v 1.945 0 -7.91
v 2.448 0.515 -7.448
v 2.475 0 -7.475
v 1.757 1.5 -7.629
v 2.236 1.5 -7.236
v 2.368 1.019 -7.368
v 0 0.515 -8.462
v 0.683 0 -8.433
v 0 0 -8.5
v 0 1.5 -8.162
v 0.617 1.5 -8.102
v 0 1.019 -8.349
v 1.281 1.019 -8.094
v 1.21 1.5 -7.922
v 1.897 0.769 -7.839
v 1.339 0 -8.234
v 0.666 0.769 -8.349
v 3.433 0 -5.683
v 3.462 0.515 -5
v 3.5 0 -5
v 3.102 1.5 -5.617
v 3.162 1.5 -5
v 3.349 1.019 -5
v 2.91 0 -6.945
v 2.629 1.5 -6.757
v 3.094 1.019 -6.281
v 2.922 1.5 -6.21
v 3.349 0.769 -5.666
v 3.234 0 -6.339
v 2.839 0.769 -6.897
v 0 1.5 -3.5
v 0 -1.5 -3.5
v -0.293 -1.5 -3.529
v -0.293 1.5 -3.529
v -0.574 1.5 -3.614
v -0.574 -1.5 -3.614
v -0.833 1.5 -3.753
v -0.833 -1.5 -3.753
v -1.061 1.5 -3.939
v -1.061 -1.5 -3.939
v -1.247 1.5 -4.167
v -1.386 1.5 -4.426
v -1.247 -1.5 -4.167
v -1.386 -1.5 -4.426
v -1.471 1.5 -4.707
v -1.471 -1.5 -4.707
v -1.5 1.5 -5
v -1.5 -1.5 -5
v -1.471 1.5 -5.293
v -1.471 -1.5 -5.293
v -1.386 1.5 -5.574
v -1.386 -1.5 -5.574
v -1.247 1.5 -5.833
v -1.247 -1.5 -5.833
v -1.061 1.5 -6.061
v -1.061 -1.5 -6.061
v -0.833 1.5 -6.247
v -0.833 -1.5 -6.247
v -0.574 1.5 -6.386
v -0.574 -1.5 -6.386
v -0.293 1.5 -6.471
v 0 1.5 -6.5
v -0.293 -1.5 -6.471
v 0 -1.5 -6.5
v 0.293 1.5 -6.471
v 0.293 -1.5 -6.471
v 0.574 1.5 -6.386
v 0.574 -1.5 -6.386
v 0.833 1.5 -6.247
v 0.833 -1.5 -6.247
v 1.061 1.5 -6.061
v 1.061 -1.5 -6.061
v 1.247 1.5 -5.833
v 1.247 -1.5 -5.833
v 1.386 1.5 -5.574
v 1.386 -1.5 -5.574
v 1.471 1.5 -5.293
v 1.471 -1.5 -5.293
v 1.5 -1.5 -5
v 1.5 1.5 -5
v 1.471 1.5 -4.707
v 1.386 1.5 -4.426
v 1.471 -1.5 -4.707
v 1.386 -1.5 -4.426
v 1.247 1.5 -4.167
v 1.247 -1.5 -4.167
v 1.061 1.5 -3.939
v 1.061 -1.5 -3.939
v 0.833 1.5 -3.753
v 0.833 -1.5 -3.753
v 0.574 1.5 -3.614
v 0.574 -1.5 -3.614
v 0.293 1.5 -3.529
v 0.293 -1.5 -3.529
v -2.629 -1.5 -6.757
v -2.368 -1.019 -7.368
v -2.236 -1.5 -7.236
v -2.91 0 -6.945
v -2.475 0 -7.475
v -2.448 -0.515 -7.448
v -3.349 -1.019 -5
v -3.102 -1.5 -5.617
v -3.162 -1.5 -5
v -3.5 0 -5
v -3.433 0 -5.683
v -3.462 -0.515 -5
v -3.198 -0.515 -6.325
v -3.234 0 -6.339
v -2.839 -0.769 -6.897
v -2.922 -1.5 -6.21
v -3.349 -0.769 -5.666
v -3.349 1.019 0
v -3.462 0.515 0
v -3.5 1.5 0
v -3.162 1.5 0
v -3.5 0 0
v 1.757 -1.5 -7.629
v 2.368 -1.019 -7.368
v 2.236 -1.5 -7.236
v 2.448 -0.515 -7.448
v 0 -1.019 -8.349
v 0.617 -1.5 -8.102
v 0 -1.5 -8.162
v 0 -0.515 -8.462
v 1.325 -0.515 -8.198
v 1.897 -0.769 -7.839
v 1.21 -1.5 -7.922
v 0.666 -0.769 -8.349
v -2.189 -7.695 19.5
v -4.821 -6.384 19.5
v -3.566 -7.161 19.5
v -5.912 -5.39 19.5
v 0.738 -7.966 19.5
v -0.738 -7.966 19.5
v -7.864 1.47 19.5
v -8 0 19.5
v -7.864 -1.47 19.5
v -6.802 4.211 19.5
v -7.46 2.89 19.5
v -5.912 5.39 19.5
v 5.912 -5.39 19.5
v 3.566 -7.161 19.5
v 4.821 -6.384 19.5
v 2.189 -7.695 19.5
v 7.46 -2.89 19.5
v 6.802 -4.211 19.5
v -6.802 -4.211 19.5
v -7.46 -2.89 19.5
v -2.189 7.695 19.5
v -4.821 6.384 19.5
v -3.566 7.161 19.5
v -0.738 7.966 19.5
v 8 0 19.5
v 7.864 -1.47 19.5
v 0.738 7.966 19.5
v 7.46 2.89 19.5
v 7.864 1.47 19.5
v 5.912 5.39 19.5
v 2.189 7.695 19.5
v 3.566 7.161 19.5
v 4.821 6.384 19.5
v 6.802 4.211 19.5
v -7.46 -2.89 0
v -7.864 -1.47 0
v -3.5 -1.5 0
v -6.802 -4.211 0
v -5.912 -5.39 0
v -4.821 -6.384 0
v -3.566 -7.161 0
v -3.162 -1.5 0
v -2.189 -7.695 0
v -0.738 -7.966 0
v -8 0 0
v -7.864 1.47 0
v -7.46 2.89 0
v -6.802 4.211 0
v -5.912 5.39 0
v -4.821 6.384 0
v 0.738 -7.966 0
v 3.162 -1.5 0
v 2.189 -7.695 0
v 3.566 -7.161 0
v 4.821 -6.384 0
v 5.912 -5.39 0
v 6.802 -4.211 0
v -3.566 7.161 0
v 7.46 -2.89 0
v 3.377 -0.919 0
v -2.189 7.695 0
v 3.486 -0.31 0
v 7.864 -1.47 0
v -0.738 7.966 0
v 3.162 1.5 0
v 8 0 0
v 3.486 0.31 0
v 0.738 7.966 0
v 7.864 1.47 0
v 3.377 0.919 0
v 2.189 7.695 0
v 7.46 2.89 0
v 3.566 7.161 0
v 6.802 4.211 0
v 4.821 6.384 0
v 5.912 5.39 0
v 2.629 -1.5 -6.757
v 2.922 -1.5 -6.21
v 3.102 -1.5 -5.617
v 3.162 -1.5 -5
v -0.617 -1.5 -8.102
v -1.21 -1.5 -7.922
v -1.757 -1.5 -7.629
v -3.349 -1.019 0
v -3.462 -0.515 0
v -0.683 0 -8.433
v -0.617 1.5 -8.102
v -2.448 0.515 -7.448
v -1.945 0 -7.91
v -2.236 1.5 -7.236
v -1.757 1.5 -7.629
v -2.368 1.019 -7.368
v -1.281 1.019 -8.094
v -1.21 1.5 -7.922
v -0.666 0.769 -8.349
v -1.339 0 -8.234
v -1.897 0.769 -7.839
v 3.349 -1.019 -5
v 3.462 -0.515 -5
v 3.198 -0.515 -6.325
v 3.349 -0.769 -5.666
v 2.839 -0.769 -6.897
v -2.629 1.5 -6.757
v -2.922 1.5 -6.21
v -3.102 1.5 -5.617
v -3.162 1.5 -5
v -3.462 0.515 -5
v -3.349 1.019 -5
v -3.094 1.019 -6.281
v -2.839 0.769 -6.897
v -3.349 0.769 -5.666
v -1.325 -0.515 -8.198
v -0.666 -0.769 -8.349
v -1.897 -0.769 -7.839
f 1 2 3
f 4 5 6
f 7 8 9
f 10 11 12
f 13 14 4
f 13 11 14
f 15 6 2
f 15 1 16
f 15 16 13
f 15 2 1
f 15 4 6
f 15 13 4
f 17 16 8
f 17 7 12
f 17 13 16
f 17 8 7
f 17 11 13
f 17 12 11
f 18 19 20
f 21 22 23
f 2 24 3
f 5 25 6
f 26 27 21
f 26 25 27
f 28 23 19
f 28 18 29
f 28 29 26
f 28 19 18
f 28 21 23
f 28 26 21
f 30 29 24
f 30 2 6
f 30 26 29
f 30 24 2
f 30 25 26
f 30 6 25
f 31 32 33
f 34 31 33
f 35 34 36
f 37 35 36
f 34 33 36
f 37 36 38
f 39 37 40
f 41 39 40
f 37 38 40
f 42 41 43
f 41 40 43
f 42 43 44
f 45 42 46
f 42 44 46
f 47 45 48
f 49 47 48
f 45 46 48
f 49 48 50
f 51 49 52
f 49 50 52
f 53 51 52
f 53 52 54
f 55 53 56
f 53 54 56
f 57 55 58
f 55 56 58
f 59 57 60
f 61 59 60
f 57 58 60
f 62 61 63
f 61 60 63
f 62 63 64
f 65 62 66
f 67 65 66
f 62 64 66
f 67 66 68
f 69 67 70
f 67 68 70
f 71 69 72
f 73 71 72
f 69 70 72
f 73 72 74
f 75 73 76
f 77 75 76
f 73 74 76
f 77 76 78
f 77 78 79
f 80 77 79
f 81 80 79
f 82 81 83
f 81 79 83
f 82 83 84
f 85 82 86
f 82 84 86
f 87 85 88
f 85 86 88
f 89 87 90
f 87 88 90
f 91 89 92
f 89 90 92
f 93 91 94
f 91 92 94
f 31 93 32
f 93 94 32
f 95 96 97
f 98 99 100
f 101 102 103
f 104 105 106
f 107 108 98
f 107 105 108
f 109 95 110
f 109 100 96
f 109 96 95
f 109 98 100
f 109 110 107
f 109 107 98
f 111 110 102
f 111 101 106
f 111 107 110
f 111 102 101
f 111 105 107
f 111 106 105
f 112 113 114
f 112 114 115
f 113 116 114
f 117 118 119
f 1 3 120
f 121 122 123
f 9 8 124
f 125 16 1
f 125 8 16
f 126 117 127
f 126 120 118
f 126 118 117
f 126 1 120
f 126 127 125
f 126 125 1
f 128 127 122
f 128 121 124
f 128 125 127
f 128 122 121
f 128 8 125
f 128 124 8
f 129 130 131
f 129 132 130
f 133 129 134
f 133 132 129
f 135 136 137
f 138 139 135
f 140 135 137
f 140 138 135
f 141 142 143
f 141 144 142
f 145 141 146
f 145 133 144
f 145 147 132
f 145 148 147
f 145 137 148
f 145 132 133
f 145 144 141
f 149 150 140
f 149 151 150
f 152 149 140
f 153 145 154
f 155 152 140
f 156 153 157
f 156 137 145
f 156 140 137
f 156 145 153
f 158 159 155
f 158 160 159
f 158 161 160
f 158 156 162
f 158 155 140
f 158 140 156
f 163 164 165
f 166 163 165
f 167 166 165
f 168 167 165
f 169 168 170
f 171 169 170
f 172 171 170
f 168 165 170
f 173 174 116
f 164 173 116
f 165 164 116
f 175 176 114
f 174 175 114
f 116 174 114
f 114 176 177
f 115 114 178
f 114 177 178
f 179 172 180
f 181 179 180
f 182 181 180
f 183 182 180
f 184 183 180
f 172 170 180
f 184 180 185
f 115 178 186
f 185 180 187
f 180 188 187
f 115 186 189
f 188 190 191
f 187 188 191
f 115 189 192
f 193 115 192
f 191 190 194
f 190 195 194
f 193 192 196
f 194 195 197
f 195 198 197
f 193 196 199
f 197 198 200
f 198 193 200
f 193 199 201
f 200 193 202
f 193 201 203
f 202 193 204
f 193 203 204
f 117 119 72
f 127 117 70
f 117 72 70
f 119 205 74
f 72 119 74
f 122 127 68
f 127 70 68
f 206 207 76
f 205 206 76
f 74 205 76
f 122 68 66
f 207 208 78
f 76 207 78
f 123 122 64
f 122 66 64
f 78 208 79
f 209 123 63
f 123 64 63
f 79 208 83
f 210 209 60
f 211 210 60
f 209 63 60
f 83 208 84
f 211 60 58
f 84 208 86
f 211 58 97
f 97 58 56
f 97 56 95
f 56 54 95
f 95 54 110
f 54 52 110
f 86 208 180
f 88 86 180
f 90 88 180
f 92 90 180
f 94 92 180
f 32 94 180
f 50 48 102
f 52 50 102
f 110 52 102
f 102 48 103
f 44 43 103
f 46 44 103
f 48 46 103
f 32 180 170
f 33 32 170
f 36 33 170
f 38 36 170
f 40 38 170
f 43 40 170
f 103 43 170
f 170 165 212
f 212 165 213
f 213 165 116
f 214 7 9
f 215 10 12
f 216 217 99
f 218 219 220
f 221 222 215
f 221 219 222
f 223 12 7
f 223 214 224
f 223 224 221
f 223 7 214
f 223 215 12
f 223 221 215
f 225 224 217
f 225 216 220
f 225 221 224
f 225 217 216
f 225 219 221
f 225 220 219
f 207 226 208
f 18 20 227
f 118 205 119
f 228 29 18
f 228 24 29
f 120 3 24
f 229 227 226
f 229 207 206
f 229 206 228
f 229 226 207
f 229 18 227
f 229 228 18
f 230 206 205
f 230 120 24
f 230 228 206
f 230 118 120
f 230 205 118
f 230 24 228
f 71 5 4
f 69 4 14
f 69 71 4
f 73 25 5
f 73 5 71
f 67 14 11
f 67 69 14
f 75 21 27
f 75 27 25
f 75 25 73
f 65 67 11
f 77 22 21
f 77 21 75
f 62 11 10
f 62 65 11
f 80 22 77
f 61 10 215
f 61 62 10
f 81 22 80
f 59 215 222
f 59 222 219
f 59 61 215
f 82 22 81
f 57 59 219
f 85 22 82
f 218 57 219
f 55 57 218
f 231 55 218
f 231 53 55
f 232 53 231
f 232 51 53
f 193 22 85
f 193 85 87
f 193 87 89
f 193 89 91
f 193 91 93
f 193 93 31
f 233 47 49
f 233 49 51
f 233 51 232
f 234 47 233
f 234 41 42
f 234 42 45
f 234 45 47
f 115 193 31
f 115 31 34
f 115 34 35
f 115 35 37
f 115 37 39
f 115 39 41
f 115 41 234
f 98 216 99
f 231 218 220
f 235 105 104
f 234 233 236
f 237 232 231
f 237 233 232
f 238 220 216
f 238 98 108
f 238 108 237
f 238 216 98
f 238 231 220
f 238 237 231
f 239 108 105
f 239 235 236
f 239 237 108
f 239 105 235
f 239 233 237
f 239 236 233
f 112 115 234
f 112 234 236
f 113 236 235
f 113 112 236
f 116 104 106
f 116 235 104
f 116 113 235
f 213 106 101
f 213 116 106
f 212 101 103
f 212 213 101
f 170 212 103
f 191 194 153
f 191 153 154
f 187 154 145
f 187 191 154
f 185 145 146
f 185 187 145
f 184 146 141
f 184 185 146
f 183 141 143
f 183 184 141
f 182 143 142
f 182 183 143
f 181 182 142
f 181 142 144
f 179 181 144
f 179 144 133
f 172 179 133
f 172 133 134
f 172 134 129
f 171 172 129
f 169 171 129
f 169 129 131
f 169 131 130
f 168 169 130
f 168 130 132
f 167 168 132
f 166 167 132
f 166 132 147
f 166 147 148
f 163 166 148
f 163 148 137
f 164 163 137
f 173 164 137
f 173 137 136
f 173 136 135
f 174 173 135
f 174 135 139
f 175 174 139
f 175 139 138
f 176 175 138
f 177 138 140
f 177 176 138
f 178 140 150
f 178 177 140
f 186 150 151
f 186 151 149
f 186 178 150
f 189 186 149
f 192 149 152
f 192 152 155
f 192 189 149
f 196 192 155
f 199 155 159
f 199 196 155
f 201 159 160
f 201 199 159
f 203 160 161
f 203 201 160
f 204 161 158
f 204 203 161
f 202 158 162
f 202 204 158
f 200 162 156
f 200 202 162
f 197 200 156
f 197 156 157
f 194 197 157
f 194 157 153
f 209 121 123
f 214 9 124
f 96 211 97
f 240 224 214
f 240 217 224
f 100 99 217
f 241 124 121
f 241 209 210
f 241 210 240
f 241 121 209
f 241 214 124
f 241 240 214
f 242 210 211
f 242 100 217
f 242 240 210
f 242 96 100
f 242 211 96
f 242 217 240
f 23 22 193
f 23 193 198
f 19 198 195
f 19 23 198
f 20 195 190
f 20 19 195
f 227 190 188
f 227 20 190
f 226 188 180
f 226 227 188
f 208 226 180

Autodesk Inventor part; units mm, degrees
ref_plane "YZ Plane" through (0, 0, 0) normal (1, 0, 0) x (0, 1, 0)
ref_plane "XZ Plane" through (0, 0, 0) normal (0, 1, 0) x (-1, 0, 0)
ref_plane "XY Plane" through (0, 0, 0) normal (0, 0, 1) x (1, 0, 0)
sketch "Skizze1" plane through (0, 0, 0) normal (0, 0, 1) x (1, 0, 0)
  line L0 (-11.2, 0) -> (11.2, 0) projected
  line L1 (0, -11.2) -> (0, 11.2) projected
  circle A0 centre (0, 0) radius 8
  dimension "d0" = 16
extrude "Extrusion1" add sketch "Skizze1" along normal blind 19.5
sketch "Skizze2" plane through (0, 0, 0) normal (0, 1, 0) x (-1, 0, 0)
  line L0 (11.2, 0) -> (-11.2, 0) projected
  line L1 (0, -3.9) -> (0, 23.4) projected
  arc A0 (-3.5, -5) -> (3.5, -5) centre (0, -5) ccw
  line L2 (3.5, -5) -> (3.5, 0)
  line L3 (-8, 0) -> (8, 0) projected
  line L4 (-3.5, -5) -> (-3.5, 0)
  point P0 (0, 0)
  dimension "d3" = 3.5
  dimension "d4" = 5
extrude "Extrusion2" add sketch "Skizze2" along normal mid plane 3
sketch "Skizze3" plane through (0, 1.5, 0) normal (0, 1, 0) x (1, 0, 0)
  arc A0 (3.5, 5) -> (-3.5, 5) centre (0, 5) ccw projected
  point P0 (0, 0)
hole "Bohrung1" at (0, 1.5, -5) direction (0, -1, 0) diameter 3 end through all
sketch "Skizze4" plane through (0, 0, 0) normal (0, 0, -1) x (-1, 0, 0)
  line L0 (-3.5, -1.5) -> (-3.5, 1.5) projected
  line L1 (3.5, -1.5) -> (3.5, 1.5) projected
  line L2 (-3.5, 1.5) -> (3.5, 1.5) projected
  line L3 (-3.5, -1.5) -> (-3.5, 1.5) projected
  line L4 (3.5, -1.5) -> (-3.5, -1.5) projected
  arc A0 (-3.1623, 1.5) -> (-3.1623, -1.5) centre (0, 0) ccw
  line L5 (-3.1623, 1.5) -> (-3.8633, 1.5)
  line L6 (-3.8633, 1.5) -> (-3.8633, -1.5)
  line L7 (-3.8633, -1.5) -> (-3.1623, -1.5)
  dimension "d14" = 3.5
  dimension "d15" = 3.8632
sketch "Skizze5" plane through (0, -1.5, 0) normal (0, -1, 0) x (1, 0, 0)
  arc A0 (-3.5, -5) -> (3.5, -5) centre (0, -5) ccw projected
  arc A1 (-3.5, -5) -> (3.5, -5) centre (0, -5) ccw
  line L0 (-3.5, 0) -> (-3.5, -5)
  line L1 (3.5, -5) -> (3.5, 0.5133)
  point P0 (0, 0)
sketch3d "3D-Skizze1"
  line L0 (3.5, -1.5, 0) -> (3.5, -1.5, -5)
  arc A0 (-3.5, -1.5, -5) -> (-2.4749, -1.5, -7.4749) centre (0, -1.5, -5) ccw
  arc A1 (-2.4749, -1.5, -7.4749) -> (0, -1.5, -8.5) centre (0, -1.5, -5) ccw
  arc A2 (0, -1.5, -8.5) -> (2.4749, -1.5, -7.4749) centre (0, -1.5, -5) ccw
  arc A3 (2.4749, -1.5, -7.4749) -> (3.5, -1.5, -5) centre (0, -1.5, -5) ccw
  line L1 (-3.5, -1.5, -5) -> (-3.5, -1.5, 0)
sweep "Sweeping1" cut profiles "Skizze4" path "3D-Skizze1" contours L7 L6 L5 L0 | L0 A0 L4 | L0 L2 A0
properties part number "Kolben"
